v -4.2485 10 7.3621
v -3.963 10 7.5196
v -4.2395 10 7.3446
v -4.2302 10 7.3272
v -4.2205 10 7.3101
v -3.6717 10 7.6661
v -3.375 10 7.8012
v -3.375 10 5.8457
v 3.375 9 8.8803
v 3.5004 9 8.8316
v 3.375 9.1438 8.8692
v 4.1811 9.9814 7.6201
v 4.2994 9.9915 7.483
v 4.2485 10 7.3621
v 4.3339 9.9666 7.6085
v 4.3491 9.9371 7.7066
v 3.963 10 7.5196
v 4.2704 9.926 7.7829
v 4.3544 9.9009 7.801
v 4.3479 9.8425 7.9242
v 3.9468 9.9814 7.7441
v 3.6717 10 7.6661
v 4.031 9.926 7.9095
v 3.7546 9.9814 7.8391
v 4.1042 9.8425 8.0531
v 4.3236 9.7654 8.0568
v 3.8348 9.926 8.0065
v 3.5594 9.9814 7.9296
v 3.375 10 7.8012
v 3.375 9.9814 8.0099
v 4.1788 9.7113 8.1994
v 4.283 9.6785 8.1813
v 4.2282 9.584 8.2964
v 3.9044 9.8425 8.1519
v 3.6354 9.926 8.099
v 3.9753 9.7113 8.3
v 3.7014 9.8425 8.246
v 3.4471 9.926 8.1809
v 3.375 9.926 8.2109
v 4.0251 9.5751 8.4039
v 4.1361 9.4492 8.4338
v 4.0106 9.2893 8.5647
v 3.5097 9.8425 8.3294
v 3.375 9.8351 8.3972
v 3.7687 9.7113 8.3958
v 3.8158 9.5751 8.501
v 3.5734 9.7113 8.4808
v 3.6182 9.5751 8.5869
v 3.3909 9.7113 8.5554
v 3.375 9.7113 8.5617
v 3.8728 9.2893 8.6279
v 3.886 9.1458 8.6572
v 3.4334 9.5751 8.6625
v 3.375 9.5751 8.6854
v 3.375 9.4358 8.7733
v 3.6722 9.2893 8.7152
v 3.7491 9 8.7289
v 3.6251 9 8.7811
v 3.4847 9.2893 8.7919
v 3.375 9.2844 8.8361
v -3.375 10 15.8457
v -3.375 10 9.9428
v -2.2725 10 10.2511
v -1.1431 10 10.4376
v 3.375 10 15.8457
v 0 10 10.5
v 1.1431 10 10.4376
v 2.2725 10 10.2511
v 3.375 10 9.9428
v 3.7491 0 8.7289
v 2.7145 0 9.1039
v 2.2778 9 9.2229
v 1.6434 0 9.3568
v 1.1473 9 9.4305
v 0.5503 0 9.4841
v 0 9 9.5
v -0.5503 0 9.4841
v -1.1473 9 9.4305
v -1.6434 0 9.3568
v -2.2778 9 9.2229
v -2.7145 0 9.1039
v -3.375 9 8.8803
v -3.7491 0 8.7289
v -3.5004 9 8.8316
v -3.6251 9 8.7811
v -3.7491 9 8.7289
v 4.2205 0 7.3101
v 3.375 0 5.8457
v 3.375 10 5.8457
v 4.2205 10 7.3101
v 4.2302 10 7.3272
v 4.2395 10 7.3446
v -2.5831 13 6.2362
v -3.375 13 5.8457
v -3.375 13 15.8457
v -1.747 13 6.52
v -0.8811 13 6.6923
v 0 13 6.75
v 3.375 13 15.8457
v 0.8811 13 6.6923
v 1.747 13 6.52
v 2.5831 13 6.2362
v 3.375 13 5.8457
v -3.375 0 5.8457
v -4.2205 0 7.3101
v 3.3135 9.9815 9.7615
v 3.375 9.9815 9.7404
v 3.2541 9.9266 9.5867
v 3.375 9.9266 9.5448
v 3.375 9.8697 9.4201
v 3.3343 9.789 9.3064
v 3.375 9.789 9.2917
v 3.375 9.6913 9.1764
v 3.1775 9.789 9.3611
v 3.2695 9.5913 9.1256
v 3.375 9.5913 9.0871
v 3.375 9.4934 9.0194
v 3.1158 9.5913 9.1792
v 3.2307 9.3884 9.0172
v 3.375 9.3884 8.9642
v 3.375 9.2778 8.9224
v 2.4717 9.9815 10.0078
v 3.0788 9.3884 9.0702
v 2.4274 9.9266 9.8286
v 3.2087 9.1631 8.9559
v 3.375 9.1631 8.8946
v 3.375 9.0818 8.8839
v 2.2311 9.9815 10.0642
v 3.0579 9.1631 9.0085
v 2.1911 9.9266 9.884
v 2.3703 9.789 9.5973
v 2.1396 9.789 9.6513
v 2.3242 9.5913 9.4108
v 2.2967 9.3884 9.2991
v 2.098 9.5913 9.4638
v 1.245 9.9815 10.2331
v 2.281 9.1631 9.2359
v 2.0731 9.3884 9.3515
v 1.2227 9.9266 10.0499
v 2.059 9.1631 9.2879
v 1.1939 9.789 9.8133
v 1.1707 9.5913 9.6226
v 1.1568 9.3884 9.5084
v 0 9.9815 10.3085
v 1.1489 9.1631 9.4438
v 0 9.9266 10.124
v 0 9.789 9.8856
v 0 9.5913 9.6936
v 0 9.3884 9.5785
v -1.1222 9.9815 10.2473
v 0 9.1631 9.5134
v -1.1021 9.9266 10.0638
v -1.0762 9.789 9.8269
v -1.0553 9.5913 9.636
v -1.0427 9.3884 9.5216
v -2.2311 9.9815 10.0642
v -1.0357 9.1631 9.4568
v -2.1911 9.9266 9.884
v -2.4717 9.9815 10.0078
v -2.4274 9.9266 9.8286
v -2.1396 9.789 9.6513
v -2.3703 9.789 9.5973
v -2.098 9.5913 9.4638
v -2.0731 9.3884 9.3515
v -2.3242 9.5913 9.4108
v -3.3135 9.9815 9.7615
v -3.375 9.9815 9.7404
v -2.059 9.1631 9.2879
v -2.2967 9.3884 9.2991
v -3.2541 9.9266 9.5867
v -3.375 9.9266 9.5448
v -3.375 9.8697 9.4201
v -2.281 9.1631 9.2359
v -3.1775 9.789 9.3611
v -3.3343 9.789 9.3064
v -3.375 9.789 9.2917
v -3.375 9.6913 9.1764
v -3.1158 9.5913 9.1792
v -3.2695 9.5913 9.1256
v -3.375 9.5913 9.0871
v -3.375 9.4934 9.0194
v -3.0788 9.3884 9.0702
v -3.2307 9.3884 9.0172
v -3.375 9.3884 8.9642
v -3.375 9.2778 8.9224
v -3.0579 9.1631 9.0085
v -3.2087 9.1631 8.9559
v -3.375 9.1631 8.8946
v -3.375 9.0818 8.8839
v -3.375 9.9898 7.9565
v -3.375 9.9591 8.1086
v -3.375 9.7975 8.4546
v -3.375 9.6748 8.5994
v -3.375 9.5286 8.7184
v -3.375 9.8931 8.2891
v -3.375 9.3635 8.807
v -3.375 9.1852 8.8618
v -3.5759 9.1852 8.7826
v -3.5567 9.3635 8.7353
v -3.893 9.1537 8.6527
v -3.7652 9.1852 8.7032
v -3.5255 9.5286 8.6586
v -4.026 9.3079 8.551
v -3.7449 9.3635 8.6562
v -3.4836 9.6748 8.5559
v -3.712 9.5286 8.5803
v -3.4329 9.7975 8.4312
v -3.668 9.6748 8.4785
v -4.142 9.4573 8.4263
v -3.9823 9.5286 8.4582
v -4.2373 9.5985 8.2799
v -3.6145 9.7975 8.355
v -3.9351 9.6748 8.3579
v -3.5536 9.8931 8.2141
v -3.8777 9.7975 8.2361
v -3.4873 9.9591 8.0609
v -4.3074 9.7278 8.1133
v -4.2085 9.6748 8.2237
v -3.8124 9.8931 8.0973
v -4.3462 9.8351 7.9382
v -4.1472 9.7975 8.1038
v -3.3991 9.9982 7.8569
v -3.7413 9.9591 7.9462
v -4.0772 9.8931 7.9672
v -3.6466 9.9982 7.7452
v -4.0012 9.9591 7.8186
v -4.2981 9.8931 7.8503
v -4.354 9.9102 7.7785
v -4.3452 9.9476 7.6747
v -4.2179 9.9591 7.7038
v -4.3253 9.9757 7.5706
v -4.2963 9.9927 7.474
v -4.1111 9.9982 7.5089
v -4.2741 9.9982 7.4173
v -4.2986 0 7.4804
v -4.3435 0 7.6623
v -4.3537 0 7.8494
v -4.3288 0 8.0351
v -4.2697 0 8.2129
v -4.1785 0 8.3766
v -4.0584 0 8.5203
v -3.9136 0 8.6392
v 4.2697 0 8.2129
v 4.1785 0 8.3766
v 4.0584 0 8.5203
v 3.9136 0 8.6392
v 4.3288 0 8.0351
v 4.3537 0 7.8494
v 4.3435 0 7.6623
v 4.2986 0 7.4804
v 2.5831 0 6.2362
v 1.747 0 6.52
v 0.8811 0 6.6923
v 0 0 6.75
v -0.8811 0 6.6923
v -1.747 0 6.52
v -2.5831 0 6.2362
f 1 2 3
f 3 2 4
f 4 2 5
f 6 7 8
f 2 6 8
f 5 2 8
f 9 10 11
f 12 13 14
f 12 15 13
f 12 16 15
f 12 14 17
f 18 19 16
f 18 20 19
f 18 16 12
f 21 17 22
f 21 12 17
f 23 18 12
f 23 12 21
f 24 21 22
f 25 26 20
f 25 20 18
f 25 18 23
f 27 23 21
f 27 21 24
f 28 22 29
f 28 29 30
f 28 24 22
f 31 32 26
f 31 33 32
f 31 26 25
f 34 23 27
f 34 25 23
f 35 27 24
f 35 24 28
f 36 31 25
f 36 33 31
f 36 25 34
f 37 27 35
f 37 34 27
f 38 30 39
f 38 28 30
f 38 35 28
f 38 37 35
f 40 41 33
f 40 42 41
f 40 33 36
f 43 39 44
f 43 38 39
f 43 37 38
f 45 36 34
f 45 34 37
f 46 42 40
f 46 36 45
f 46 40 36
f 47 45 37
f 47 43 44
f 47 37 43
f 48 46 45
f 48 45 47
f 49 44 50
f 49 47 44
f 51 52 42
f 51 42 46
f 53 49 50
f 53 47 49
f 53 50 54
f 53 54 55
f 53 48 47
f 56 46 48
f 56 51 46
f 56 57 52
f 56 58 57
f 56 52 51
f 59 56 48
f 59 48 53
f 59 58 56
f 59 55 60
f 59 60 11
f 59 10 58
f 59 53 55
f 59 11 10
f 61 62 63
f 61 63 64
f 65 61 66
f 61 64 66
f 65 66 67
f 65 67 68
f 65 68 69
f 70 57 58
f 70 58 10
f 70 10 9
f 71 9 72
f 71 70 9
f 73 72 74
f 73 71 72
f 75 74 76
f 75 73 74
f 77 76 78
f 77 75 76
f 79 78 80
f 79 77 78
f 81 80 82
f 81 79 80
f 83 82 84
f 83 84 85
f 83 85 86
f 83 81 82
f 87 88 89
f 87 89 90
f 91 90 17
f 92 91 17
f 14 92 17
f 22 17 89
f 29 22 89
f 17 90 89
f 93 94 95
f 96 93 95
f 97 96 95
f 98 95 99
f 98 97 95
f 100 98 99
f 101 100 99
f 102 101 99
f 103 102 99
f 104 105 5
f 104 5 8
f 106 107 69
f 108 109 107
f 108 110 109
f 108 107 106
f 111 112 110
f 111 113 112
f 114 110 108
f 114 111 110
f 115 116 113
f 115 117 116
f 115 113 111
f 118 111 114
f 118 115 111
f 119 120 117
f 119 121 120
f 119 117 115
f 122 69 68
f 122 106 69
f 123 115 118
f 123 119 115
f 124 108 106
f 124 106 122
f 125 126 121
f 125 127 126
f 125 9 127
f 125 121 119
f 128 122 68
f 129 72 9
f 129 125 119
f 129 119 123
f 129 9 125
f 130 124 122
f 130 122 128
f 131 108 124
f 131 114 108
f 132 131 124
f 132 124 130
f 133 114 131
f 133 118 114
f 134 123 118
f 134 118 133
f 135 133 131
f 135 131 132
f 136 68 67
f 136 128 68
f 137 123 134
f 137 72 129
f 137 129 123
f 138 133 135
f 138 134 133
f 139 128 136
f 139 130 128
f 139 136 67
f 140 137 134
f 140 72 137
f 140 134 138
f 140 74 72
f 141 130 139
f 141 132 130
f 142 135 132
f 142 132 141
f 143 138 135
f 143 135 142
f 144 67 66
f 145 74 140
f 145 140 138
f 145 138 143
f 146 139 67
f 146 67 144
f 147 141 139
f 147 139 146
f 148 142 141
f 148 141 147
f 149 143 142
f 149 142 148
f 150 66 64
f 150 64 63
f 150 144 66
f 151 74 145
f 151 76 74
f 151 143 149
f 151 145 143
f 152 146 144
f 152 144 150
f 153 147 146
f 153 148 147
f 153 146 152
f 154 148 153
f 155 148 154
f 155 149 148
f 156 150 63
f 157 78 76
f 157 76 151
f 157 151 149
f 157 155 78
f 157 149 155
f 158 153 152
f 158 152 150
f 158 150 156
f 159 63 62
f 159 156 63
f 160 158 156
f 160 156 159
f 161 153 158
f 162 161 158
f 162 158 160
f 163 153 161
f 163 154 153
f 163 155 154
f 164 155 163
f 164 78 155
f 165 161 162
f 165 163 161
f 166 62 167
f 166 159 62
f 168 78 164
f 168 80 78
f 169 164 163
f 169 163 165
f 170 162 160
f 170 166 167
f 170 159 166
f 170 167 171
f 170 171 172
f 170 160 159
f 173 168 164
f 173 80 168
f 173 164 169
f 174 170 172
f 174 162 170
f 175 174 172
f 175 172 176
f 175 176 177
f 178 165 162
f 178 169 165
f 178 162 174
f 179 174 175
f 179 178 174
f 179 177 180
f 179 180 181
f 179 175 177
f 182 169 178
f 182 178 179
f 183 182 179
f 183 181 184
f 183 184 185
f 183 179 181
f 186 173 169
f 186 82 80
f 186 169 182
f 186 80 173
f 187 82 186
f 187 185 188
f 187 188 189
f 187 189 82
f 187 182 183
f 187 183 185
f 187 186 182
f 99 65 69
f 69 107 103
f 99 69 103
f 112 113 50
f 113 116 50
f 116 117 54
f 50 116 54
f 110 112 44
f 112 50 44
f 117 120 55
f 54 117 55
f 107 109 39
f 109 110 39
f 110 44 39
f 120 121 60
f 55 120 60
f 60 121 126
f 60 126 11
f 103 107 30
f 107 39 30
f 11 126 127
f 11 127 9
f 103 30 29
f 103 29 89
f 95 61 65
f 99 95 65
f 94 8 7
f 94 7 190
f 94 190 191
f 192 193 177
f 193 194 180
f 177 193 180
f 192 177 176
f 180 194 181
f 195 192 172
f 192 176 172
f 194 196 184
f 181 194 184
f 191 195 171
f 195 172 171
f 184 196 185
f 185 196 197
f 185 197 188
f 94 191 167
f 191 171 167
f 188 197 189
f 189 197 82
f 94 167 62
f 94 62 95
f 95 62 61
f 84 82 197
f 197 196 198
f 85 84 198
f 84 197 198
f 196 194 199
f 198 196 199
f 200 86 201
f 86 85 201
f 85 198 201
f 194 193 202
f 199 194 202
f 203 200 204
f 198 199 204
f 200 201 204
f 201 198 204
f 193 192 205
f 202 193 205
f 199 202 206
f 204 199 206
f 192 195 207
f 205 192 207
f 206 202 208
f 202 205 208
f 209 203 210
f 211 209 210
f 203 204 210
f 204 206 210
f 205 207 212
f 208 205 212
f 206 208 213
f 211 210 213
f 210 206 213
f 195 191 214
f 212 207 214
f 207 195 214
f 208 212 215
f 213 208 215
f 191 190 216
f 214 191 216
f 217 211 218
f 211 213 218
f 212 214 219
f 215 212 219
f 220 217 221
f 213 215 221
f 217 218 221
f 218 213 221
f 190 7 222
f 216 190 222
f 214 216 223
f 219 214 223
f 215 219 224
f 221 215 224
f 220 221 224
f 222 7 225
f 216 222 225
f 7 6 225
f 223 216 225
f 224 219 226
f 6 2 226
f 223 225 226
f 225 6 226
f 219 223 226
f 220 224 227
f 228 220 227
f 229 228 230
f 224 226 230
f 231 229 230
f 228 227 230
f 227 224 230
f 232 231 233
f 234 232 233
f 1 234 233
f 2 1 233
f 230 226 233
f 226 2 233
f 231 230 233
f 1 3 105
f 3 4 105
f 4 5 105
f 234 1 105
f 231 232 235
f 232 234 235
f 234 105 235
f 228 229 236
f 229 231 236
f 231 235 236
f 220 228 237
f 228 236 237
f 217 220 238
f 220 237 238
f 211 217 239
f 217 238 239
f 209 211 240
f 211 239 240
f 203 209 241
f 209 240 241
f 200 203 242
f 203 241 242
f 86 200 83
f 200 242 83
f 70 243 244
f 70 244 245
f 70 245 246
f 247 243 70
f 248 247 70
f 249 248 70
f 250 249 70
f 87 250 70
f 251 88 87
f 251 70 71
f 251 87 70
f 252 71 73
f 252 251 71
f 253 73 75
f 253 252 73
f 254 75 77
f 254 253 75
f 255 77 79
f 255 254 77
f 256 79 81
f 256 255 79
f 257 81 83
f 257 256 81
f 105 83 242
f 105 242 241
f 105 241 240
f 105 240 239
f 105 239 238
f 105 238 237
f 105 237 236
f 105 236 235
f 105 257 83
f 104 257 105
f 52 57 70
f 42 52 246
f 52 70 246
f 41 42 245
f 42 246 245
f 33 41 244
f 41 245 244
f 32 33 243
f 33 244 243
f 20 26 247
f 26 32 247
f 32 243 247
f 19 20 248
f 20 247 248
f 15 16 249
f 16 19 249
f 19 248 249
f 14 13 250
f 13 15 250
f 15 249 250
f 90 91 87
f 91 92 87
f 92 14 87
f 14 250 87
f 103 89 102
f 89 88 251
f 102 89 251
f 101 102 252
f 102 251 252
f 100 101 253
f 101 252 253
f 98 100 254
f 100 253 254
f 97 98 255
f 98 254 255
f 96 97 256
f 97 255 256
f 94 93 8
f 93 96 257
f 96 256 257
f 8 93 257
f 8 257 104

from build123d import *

# Parameters (mm, degrees)
BOSS_EXTRUDE1_DEPTH = 10
BOSS_EXTRUDE2_DEPTH = 3
FILLET1_R           = 1
FILLET2_R           = 1
FILLET3_R           = 1
FILLET4_R           = 1


with BuildPart() as part:
    # Sketch1 → Boss-Extrude1 (new body)
    with BuildSketch(Plane(origin=(0, 0, 0), x_dir=(1, 0, 0), z_dir=(0, 1, 0))):
        with BuildLine():
            ThreePointArc((4.75, -8.227241336), (0, -9.5), (-4.75, -8.227241336))
            Line((-4.75, -8.227241336), (-3.375, -5.845671476))
            ThreePointArc((-3.375, -5.845671476), (0, -6.75), (3.375, -5.845671476))
            Line((3.375, -5.845671476), (4.75, -8.227241336))
        make_face()
    extrude(amount=BOSS_EXTRUDE1_DEPTH)

    # Sketch2 → Boss-Extrude2 (add)
    with BuildSketch(Plane(origin=(0, 10, 0), x_dir=(1, 0, 0), z_dir=(0, 1, 0))):
        with BuildLine():
            Line((-3.375, -5.845671476), (-3.375, -15.845671476))
            Line((-3.375, -15.845671476), (3.375, -15.845671476))
            Line((3.375, -15.845671476), (3.375, -5.845671476))
            ThreePointArc((3.375, -5.845671476), (0, -6.75), (-3.375, -5.845671476))
        make_face()
    extrude(amount=BOSS_EXTRUDE2_DEPTH)

    # Fillet1
    fillet1_edges = [part.edges().sort_by_distance(p)[0] for p in [
        (0, 10, 9.5),
    ]]
    fillet(fillet1_edges, radius=FILLET1_R)

    # Fillet2
    fillet2_edges = [part.edges().sort_by_distance(p)[0] for p in [
        (-4.075600712, 10, 8.581344815),
    ]]
    fillet(fillet2_edges, radius=FILLET2_R)

    # Fillet3
    # the kernel refuses this fillet: 1 mm, written as the material it takes off along each edge
    with BuildSketch(Plane(origin=(-4.75, -2.798981274, 8.227241336), x_dir=(0.893983522608317, 0, 0.44809983408256804), z_dir=(0, 1, 0))) as fillet3_piece_1:
        with BuildLine():
            CenterArc((1.060666588, 0.998262358), FILLET3_R, 176.621836485, 96.756327031)
            Line((0.06240423, 1.05718828), (0, 0))
            ThreePointArc((0, 0), (0.559796255, -0.016507597), (1.11959251, 0))
        make_face()
    extrude(amount=14.597962548, mode=Mode.SUBTRACT)
    with BuildSketch(Plane(origin=(0, 10, 0), x_dir=(0.7080675160533174, 0, 0.706144739207257), z_dir=(0.706144739207257, 0, -0.7080675160533174))) as fillet3_piece_2_section:
        with BuildLine():
            CenterArc((9.5 - FILLET3_R, FILLET3_R), FILLET3_R, 270, 90)
            Line((9.5 - FILLET3_R, 0), (9.5, 0))
            Line((9.5, 0), (9.5, FILLET3_R))
        make_face()
    fillet3_piece_2 = revolve(axis=Axis((0, 10, 0), (0, -1, 0)), revolution_arc=39.346226133, mode=Mode.PRIVATE)
    fillet3_piece_2 = split(fillet3_piece_2, bisect_by=Plane(origin=(3.375, 9.768637129, 8.366507066), z_dir=(1, 0, 0)), keep=Keep.TOP, mode=Mode.PRIVATE)
    add(fillet3_piece_2, mode=Mode.SUBTRACT)

    # Fillet4
    # the kernel refuses this fillet: 1 mm, written as the material it takes off along each edge
    with BuildSketch(Plane(origin=(4.75, -2.798981274, 8.227241336), x_dir=(-0.8939835226083171, 0, 0.44809983408256765), z_dir=(0, 1, 0))) as fillet4_piece_1:
        with BuildLine():
            CenterArc((1.060666588, -0.998262358), FILLET4_R, 86.621836485, 96.756327031)
            Line((0.06240423, -1.05718828), (0, 0))
            ThreePointArc((0, 0), (0.559796255, 0.016507597), (1.11959251, 0))
        make_face()
    extrude(amount=14.597962548, mode=Mode.SUBTRACT)


solid = part.part
